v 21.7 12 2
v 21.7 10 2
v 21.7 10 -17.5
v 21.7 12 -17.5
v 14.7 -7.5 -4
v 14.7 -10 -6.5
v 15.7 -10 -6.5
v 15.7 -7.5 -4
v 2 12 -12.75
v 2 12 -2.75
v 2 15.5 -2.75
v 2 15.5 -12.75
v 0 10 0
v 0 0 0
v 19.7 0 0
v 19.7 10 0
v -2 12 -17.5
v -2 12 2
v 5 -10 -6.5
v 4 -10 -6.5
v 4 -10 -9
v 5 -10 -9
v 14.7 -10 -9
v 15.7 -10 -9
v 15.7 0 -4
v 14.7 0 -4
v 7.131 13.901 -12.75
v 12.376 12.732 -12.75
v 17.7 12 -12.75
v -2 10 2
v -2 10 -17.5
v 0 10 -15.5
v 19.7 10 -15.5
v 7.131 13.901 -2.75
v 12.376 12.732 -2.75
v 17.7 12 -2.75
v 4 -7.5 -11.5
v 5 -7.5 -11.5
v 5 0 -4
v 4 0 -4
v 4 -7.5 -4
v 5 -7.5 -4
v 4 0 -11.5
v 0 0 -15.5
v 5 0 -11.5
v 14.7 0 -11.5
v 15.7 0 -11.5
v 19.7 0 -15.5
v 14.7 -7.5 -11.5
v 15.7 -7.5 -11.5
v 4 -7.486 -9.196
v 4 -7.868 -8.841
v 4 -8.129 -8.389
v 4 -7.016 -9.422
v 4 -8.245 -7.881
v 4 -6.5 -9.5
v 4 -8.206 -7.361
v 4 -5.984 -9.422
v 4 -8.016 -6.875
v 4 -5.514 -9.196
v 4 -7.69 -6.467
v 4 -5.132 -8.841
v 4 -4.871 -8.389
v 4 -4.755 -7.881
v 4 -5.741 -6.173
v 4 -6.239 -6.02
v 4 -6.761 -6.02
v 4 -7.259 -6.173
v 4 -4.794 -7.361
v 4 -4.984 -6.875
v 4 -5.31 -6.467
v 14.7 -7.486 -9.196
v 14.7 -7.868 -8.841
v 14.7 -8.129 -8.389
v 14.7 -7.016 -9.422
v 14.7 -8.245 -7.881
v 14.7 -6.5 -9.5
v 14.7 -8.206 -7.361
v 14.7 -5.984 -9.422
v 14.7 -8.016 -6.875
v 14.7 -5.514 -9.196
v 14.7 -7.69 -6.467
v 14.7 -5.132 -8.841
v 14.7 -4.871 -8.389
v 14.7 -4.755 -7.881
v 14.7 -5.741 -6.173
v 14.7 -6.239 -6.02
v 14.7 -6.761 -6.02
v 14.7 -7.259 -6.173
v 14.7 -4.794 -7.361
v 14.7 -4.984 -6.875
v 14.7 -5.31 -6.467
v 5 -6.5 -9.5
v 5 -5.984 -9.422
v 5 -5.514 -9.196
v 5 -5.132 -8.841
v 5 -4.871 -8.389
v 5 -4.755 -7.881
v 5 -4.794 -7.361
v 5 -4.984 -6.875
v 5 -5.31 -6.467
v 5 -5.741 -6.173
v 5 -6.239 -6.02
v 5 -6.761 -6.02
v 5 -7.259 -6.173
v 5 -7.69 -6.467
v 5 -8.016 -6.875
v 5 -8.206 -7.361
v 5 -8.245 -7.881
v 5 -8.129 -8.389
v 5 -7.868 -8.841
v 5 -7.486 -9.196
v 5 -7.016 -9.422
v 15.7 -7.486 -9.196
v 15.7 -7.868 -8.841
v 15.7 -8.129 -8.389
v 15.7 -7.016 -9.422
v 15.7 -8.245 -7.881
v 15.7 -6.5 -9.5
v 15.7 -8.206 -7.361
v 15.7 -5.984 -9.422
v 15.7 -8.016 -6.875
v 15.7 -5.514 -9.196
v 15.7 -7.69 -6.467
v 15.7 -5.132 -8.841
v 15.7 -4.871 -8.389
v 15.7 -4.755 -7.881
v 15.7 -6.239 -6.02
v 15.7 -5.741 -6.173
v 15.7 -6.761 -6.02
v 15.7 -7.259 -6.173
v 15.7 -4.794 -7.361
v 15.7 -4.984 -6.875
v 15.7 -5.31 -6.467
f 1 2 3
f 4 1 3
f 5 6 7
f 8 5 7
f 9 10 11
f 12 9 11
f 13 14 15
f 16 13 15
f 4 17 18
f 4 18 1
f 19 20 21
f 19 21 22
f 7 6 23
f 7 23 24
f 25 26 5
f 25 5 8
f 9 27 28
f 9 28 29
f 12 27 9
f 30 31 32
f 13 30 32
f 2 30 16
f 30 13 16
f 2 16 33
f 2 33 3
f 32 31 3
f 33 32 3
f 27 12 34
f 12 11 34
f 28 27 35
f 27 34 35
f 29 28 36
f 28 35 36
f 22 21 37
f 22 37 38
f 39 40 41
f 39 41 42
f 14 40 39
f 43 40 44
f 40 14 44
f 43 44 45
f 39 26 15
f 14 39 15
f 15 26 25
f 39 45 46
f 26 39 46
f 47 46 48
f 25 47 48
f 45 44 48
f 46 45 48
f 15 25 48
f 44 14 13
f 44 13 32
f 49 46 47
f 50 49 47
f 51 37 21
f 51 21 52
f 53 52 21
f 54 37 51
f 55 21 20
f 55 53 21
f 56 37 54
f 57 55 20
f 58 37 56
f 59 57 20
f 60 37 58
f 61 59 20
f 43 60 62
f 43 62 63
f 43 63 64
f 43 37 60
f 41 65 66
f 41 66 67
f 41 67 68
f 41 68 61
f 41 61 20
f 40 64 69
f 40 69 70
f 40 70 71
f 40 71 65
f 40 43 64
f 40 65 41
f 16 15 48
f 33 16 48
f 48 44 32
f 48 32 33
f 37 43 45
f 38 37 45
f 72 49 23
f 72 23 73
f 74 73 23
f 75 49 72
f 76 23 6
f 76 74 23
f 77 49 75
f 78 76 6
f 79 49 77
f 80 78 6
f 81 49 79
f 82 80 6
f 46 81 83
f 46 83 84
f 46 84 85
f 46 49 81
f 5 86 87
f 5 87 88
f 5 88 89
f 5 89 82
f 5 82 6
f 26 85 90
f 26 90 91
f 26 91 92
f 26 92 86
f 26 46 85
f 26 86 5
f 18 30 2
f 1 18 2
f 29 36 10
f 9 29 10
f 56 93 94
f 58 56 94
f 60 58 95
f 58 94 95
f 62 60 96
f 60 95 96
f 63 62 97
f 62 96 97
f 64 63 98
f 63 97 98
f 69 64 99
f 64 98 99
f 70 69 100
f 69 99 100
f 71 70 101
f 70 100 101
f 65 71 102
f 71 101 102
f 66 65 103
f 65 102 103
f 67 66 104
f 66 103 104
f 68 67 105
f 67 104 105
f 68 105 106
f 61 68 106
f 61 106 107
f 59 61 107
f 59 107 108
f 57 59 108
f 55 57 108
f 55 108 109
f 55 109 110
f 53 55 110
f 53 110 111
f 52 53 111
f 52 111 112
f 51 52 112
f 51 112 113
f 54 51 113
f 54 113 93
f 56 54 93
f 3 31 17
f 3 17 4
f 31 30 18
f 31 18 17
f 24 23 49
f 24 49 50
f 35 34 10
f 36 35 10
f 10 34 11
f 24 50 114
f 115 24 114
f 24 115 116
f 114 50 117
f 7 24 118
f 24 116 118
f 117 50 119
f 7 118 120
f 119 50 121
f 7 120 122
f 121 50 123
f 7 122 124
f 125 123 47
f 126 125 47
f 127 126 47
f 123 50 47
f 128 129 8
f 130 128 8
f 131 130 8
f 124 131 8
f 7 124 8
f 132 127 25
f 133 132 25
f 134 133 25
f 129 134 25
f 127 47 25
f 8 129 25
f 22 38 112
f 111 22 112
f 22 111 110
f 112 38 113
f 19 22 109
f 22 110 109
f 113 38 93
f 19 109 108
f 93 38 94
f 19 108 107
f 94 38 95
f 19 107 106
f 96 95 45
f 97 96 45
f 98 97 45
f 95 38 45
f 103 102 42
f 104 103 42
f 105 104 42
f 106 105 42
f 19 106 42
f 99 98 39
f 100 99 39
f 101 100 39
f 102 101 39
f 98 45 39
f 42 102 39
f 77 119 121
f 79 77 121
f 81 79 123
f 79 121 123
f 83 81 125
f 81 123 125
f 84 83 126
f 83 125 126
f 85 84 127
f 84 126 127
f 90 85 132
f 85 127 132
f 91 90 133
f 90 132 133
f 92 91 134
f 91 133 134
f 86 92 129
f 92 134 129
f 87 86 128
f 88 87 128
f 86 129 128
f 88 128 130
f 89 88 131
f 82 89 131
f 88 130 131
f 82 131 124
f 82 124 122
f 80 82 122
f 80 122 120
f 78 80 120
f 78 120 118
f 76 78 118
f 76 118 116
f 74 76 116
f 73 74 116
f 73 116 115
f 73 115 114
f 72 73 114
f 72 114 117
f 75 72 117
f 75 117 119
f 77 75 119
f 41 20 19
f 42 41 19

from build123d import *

# Parameters (mm, degrees)
CROQUIS1_W              = 19.7
CROQUIS1_H              = 15.5
SALIENTE_EXTRUIR1_DEPTH = 10
CROQUIS2_W              = 23.7
CROQUIS2_H              = 19.5
SALIENTE_EXTRUIR2_DEPTH = 2
SALIENTE_EXTRUIR3_DEPTH = 5
CROQUIS4_W              = 1
CROQUIS4_H              = 7.5
SALIENTE_EXTRUIR4_DEPTH = 10
CHAFL_N1_SIZE           = 2.5
CORTAR_EXTRUIR1_REACH   = 31.322
CROQUIS5_R              = 1.75


with BuildPart() as part:
    # Croquis1 → Saliente-Extruir1 (new body)
    with BuildSketch(Plane(origin=(0, 0, 0), x_dir=(1, 0, 0), z_dir=(0, 1, 0))):
        with Locations((9.85, 7.75)):
            Rectangle(CROQUIS1_W, CROQUIS1_H)
    extrude(amount=SALIENTE_EXTRUIR1_DEPTH)

    # Croquis2 → Saliente-Extruir2 (add)
    with BuildSketch(Plane(origin=(0, 10, 0), x_dir=(1, 0, 0), z_dir=(0, 1, 0))):
        with Locations((9.85, 7.75)):
            Rectangle(CROQUIS2_W, CROQUIS2_H)
    extrude(amount=SALIENTE_EXTRUIR2_DEPTH)

    # Croquis4 → Saliente-Extruir4 (add)
    with BuildSketch(Plane.XZ):
        with Locations((15.2, -7.75)):
            Rectangle(CROQUIS4_W, CROQUIS4_H)
        with Locations((4.5, -7.75)):
            Rectangle(CROQUIS4_W, CROQUIS4_H)
    extrude(amount=SALIENTE_EXTRUIR4_DEPTH)

    # Chaflán1
    chafl_n1_edges = [part.edges().sort_by_distance(p)[0] for p in [
        (15.2, -10, -11.5),
        (15.2, -10, -4),
        (4.5, -10, -11.5),
        (4.5, -10, -4),
    ]]
    chamfer(chafl_n1_edges, length=CHAFL_N1_SIZE)

    # Cortar-Extruir1: up to this face of the body (flat: up to its plane)
    cortar_extruir1_end = Plane(part.part.faces().sort_by_distance((4, -4.621212121, -7.75))[0])
    # Croquis5 → Cortar-Extruir1 (cut, up to the picked face)
    with BuildSketch(Plane(origin=(15.7, 0, 0), x_dir=(0, 0, -1), z_dir=(1, 0, 0)), mode=Mode.PRIVATE) as cortar_extruir1_sk1:
        with Locations((7.75, -6.5)):
            Circle(CROQUIS5_R)
    cortar_extruir1_tool1 = split(extrude(cortar_extruir1_sk1.sketch, amount=-CORTAR_EXTRUIR1_REACH, mode=Mode.PRIVATE), bisect_by=cortar_extruir1_end, keep=Keep.BOTH, mode=Mode.PRIVATE)
    add(cortar_extruir1_tool1.solids().sort_by(Axis((15.7, -6.5, -7.75), (-1, 0, 0)))[0], mode=Mode.SUBTRACT)


with BuildPart() as body_2:
    # Croquis3 → Saliente-Extruir3 (new, symmetric)
    with BuildSketch(Plane.XY.offset(-7.75)):
        with BuildLine():
            Line((2, 12), (2, 15.5))
            ThreePointArc((2, 15.5), (9.741315307, 13.262471521), (17.7, 12))
            Line((17.7, 12), (2, 12))
        make_face()
    extrude(amount=SALIENTE_EXTRUIR3_DEPTH, both=True)


solid = Compound([part.part, body_2.part])
